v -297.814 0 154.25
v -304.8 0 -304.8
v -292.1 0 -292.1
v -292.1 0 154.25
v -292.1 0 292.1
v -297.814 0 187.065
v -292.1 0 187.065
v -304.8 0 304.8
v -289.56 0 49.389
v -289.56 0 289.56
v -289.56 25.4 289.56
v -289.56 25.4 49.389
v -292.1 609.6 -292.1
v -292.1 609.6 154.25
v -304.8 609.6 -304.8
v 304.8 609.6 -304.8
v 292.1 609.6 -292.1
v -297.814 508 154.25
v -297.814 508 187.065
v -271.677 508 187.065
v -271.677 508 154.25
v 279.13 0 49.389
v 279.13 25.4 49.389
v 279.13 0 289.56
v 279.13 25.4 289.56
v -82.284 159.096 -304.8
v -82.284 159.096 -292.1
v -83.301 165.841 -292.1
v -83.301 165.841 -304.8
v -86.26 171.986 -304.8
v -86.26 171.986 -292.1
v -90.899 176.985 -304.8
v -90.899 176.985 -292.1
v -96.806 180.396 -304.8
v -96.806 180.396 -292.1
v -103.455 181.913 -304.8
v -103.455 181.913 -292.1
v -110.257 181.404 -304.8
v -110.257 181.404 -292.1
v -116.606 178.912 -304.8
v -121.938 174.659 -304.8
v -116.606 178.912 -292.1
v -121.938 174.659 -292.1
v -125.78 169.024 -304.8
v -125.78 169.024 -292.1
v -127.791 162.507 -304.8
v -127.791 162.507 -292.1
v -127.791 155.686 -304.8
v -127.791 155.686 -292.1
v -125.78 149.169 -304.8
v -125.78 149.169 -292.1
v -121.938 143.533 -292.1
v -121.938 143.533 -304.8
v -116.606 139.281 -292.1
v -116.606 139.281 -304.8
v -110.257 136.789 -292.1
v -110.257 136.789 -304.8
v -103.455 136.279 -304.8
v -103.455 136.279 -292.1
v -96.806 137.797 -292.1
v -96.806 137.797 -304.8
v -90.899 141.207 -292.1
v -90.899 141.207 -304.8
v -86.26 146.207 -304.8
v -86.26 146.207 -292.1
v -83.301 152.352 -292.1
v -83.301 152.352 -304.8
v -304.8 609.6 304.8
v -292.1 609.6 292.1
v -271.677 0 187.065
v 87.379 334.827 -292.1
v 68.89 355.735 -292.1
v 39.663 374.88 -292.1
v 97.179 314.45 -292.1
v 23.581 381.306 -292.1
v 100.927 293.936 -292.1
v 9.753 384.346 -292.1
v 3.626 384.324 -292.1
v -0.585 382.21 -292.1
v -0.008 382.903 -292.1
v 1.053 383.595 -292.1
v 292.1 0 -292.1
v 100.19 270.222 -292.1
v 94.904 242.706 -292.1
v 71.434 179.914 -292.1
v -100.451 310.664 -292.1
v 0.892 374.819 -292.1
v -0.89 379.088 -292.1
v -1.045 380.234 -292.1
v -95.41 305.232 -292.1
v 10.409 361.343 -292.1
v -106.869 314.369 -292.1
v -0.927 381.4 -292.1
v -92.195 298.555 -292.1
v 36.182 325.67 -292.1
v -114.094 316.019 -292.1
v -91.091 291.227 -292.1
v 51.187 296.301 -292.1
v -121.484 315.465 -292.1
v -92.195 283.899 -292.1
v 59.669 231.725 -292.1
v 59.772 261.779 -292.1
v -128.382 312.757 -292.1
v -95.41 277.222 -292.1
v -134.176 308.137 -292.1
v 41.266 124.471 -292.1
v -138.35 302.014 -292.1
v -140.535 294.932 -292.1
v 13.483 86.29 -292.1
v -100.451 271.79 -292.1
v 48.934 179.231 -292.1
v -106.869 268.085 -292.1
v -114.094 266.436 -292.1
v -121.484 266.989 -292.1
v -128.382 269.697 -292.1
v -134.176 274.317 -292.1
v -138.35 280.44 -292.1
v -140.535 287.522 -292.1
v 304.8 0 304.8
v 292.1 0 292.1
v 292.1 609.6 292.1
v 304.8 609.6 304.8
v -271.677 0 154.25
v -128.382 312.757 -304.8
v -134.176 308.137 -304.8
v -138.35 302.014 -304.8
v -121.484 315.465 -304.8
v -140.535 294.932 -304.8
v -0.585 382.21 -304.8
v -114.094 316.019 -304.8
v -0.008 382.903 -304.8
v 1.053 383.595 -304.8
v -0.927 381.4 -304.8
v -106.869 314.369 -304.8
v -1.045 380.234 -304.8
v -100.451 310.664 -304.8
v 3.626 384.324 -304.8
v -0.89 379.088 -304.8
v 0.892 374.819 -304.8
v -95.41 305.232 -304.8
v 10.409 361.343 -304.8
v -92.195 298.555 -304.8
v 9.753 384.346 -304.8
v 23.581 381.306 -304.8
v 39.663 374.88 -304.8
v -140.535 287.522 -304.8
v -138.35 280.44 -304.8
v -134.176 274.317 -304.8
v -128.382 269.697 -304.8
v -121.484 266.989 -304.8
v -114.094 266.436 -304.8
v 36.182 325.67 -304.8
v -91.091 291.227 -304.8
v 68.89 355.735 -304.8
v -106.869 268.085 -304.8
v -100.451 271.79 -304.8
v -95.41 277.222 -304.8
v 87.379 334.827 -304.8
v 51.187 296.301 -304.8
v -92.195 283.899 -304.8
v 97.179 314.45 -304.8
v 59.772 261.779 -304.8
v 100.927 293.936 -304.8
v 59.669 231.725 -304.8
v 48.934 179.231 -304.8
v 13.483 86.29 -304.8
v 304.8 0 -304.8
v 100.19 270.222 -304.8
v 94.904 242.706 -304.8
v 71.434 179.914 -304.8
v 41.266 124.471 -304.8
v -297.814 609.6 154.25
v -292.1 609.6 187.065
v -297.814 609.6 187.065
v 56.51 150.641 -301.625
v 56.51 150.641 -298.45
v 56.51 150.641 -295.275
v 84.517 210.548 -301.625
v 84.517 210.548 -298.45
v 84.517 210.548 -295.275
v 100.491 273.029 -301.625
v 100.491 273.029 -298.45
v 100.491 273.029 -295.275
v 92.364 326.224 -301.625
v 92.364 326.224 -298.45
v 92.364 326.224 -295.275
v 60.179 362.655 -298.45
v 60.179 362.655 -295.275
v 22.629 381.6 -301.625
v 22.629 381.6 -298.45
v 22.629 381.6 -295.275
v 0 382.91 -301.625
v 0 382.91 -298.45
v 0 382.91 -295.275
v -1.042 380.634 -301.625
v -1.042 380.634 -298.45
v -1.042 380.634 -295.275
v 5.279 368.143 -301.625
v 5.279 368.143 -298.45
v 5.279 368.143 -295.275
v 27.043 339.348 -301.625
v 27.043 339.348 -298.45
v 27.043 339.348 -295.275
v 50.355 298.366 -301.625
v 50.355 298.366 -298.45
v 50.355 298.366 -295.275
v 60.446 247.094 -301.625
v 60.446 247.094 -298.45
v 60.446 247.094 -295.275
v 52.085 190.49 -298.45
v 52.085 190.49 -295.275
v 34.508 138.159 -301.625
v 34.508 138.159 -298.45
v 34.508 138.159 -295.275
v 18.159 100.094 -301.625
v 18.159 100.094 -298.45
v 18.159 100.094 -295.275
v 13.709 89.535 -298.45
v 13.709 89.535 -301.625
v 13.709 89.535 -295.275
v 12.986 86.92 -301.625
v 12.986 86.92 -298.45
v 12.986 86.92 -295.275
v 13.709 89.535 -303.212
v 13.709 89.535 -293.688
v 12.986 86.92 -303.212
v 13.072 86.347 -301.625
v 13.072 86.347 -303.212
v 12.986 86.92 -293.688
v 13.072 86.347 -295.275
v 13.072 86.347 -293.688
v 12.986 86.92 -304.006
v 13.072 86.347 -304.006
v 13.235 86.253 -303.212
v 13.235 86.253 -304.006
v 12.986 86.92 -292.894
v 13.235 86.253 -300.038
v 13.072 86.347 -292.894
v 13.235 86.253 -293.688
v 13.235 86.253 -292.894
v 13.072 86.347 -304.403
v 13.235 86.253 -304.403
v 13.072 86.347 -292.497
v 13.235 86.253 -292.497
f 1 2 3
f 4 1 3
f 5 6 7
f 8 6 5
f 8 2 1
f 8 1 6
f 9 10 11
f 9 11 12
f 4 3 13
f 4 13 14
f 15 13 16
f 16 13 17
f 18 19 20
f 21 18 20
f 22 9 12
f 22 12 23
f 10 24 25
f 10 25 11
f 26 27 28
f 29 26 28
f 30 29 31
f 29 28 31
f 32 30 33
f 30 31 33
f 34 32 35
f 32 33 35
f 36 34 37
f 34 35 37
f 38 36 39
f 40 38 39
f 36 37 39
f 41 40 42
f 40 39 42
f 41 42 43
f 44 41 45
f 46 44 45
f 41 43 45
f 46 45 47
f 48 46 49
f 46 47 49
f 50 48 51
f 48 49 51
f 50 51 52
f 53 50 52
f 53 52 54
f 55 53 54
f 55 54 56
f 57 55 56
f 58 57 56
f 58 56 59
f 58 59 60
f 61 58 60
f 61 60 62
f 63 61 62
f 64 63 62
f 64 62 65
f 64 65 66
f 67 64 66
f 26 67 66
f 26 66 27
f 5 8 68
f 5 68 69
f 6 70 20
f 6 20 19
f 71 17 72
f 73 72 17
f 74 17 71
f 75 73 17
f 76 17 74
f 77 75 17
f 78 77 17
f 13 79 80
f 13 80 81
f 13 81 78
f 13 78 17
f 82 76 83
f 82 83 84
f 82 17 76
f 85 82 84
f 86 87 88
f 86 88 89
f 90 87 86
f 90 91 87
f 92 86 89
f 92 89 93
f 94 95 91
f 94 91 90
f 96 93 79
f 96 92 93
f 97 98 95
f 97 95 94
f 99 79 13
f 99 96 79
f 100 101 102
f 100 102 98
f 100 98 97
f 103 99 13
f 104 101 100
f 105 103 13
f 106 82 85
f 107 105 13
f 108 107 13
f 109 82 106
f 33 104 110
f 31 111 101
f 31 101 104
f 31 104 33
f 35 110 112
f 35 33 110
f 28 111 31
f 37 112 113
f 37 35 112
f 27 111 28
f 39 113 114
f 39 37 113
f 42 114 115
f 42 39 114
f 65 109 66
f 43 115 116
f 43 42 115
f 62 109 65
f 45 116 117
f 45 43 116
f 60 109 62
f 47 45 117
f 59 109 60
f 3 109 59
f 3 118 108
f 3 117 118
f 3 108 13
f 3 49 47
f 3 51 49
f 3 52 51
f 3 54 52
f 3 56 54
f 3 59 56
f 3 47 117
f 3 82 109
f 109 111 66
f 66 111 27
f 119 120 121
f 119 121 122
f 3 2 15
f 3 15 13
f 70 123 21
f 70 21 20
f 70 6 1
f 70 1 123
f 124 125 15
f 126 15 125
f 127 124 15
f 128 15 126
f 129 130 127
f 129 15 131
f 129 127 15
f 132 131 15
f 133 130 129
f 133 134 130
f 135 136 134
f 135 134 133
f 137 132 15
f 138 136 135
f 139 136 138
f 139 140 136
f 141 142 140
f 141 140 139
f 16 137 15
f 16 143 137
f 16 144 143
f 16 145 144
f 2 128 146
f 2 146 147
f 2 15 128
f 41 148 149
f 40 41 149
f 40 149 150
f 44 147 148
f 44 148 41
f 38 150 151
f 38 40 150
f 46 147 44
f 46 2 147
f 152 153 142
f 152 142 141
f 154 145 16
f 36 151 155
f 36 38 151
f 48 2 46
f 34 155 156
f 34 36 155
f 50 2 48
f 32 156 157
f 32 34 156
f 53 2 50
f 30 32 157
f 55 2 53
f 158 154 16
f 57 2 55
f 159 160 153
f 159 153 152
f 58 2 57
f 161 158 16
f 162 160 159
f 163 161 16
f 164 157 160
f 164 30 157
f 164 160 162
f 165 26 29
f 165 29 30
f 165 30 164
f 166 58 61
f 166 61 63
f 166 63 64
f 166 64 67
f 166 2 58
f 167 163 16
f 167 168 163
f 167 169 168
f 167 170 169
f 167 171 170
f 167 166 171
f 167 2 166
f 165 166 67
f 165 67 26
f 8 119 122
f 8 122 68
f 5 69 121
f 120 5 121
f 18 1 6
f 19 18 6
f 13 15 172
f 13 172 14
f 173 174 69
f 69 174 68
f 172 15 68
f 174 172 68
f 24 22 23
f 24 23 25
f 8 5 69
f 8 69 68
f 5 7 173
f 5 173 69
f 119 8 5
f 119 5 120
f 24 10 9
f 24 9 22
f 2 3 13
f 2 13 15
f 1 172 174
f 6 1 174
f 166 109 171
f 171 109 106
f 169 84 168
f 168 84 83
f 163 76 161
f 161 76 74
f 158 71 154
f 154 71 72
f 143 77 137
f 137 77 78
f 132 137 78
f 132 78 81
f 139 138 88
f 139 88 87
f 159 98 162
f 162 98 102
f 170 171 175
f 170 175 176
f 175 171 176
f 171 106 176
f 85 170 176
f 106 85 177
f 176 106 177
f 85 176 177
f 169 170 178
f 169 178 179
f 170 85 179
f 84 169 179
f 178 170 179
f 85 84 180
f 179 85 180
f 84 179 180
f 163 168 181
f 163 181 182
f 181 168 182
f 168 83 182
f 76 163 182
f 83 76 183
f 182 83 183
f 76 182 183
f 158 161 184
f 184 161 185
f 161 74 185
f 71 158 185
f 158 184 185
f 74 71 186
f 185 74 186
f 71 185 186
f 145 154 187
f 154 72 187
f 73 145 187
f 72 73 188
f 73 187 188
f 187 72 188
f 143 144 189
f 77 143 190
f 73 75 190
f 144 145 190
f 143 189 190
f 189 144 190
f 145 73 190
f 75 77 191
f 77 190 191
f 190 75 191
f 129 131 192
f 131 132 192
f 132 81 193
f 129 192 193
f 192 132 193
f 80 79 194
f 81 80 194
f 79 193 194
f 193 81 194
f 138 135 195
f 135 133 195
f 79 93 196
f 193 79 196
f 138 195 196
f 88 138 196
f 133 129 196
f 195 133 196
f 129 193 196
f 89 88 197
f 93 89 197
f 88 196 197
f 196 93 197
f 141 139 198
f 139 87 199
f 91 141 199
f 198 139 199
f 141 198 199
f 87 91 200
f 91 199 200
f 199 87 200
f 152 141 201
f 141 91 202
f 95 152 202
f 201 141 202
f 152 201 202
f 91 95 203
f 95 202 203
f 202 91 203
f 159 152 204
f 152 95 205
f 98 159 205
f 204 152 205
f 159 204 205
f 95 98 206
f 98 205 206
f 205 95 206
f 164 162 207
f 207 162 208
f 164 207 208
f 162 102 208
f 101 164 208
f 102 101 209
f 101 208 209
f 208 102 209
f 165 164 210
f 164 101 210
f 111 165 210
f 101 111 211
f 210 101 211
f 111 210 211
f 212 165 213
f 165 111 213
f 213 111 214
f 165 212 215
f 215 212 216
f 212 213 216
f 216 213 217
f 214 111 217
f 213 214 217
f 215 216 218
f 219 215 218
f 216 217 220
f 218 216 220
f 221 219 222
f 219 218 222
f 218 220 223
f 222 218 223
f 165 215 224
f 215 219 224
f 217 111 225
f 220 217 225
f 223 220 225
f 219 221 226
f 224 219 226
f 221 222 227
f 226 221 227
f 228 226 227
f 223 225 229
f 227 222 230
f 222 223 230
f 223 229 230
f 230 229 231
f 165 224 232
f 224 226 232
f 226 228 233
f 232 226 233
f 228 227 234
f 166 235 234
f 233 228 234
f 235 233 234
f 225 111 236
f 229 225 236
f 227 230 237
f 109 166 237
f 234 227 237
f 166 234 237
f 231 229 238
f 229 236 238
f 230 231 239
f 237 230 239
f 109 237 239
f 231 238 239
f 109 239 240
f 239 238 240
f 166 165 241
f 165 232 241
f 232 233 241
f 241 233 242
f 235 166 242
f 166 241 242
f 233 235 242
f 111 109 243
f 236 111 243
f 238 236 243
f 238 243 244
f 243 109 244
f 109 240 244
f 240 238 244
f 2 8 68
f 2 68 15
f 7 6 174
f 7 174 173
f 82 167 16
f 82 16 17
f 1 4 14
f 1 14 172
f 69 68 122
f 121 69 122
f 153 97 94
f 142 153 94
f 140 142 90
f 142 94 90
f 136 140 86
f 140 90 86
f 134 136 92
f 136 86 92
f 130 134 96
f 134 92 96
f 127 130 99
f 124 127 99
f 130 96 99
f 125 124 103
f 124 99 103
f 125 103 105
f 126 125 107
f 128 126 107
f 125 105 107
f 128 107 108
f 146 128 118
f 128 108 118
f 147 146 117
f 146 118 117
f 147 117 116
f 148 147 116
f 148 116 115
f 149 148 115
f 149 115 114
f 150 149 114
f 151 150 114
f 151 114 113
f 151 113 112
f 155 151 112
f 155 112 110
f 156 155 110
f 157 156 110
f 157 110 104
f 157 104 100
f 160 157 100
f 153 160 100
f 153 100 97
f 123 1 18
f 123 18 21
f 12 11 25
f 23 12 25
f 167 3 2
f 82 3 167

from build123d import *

# Parameters (mm, degrees)
F1_DEPTH = 609.6
F2_DEPTH = 609.6
F3_DEPTH = 609.6
F0_W     = 17.8825953579
F0_H     = 32.8156352043
F4_DEPTH = 25.4
F0_W_2   = 5.7137433529
F0_W_3   = 2.54
F5_DEPTH = 508
F6_R     = 22.8809761475
F6_R_2   = 24.8609236325
F7_DEPTH = 304.801


with BuildPart() as f1:
    # F0 (on Front) → F1 (new body)
    with BuildSketch(Plane.XZ):
        Polygon((292.1, 292.1), (304.8, 304.8), (-304.8, 304.8), (-292.1, 292.1), align=None)
    extrude(amount=-F1_DEPTH)


with BuildPart() as f2:
    # F0 (on Front) → F2 (new body, through all)
    with BuildSketch(Plane.XZ):
        Polygon((-292.1, 292.1), (-304.8, 304.8), (-304.8, -304.8), (-292.1, -292.1), (-292.1, 154.2495638132), (-297.8137433529, 154.2495638132), (-297.8137433529, 187.0651990175), (-292.1, 187.0651990175), align=None)
    extrude(amount=-F2_DEPTH)


with BuildPart() as f3:
    # F0 (on Front) → F3 (new body, through all)
    with BuildSketch(Plane.XZ):
        Polygon((-304.8, -304.8), (304.8, -304.8), (292.1, -292.1), (-292.1, -292.1), align=None)
    extrude(amount=-F3_DEPTH)

    # F6 (on Top) → F7 (cut, through all)
    with BuildSketch(Plane.XY):
        with Locations((-105.1653400064, 159.0962707996)):
            Circle(F6_R)
        with Locations((-115.9515306354, 291.2271022797)):
            Circle(F6_R_2)
        with BuildLine():
            add(Edge.make_bspline(
                [(13.4827364236, 86.2895324826), (21.1217764845, 89.0152422214), (188.3448735841, 332.3768305615), (-67.9878855252, 416.7740783563), (122.4141617398, 277.7495301707), (6.7657569122, 83.8928260479), (13.4827364236, 86.2895324826)],
                knots=[0, 0, 0, 0, 0.2998109809, 0.5142142667, 0.7363773197, 1, 1, 1, 1], degree=3))
        make_face()
    extrude(amount=-F7_DEPTH, mode=Mode.SUBTRACT)


with BuildPart() as f4:
    # F0 (on Front) → F4 (new body)
    with BuildSketch(Plane.XZ):
        Polygon((-289.56, 289.56), (-289.56, 187.0651990175), (-271.6774046421, 187.0651990175), (-271.6774046421, 154.2495638132), (-289.56, 154.2495638132), (-289.56, 49.3894317722), (279.1295847321, 49.3894317722), (279.1295847321, 289.56), align=None)
        with Locations((-280.6187023211, 170.6573814154)):
            Rectangle(F0_W, F0_H)
    extrude(amount=-F4_DEPTH)


with BuildPart() as f5:
    # F0 (on Front) → F5 (new body)
    with BuildSketch(Plane.XZ):
        with Locations((-280.6187023211, 170.6573814154)):
            Rectangle(F0_W, F0_H)
        with Locations((-294.9568716764, 170.6573814154)):
            Rectangle(F0_W_2, F0_H)
        with Locations((-290.83, 170.6573814154)):
            Rectangle(F0_W_3, F0_H)
    extrude(amount=-F5_DEPTH)


solid = Compound([f1.part, f2.part, f3.part, f4.part, f5.part])
